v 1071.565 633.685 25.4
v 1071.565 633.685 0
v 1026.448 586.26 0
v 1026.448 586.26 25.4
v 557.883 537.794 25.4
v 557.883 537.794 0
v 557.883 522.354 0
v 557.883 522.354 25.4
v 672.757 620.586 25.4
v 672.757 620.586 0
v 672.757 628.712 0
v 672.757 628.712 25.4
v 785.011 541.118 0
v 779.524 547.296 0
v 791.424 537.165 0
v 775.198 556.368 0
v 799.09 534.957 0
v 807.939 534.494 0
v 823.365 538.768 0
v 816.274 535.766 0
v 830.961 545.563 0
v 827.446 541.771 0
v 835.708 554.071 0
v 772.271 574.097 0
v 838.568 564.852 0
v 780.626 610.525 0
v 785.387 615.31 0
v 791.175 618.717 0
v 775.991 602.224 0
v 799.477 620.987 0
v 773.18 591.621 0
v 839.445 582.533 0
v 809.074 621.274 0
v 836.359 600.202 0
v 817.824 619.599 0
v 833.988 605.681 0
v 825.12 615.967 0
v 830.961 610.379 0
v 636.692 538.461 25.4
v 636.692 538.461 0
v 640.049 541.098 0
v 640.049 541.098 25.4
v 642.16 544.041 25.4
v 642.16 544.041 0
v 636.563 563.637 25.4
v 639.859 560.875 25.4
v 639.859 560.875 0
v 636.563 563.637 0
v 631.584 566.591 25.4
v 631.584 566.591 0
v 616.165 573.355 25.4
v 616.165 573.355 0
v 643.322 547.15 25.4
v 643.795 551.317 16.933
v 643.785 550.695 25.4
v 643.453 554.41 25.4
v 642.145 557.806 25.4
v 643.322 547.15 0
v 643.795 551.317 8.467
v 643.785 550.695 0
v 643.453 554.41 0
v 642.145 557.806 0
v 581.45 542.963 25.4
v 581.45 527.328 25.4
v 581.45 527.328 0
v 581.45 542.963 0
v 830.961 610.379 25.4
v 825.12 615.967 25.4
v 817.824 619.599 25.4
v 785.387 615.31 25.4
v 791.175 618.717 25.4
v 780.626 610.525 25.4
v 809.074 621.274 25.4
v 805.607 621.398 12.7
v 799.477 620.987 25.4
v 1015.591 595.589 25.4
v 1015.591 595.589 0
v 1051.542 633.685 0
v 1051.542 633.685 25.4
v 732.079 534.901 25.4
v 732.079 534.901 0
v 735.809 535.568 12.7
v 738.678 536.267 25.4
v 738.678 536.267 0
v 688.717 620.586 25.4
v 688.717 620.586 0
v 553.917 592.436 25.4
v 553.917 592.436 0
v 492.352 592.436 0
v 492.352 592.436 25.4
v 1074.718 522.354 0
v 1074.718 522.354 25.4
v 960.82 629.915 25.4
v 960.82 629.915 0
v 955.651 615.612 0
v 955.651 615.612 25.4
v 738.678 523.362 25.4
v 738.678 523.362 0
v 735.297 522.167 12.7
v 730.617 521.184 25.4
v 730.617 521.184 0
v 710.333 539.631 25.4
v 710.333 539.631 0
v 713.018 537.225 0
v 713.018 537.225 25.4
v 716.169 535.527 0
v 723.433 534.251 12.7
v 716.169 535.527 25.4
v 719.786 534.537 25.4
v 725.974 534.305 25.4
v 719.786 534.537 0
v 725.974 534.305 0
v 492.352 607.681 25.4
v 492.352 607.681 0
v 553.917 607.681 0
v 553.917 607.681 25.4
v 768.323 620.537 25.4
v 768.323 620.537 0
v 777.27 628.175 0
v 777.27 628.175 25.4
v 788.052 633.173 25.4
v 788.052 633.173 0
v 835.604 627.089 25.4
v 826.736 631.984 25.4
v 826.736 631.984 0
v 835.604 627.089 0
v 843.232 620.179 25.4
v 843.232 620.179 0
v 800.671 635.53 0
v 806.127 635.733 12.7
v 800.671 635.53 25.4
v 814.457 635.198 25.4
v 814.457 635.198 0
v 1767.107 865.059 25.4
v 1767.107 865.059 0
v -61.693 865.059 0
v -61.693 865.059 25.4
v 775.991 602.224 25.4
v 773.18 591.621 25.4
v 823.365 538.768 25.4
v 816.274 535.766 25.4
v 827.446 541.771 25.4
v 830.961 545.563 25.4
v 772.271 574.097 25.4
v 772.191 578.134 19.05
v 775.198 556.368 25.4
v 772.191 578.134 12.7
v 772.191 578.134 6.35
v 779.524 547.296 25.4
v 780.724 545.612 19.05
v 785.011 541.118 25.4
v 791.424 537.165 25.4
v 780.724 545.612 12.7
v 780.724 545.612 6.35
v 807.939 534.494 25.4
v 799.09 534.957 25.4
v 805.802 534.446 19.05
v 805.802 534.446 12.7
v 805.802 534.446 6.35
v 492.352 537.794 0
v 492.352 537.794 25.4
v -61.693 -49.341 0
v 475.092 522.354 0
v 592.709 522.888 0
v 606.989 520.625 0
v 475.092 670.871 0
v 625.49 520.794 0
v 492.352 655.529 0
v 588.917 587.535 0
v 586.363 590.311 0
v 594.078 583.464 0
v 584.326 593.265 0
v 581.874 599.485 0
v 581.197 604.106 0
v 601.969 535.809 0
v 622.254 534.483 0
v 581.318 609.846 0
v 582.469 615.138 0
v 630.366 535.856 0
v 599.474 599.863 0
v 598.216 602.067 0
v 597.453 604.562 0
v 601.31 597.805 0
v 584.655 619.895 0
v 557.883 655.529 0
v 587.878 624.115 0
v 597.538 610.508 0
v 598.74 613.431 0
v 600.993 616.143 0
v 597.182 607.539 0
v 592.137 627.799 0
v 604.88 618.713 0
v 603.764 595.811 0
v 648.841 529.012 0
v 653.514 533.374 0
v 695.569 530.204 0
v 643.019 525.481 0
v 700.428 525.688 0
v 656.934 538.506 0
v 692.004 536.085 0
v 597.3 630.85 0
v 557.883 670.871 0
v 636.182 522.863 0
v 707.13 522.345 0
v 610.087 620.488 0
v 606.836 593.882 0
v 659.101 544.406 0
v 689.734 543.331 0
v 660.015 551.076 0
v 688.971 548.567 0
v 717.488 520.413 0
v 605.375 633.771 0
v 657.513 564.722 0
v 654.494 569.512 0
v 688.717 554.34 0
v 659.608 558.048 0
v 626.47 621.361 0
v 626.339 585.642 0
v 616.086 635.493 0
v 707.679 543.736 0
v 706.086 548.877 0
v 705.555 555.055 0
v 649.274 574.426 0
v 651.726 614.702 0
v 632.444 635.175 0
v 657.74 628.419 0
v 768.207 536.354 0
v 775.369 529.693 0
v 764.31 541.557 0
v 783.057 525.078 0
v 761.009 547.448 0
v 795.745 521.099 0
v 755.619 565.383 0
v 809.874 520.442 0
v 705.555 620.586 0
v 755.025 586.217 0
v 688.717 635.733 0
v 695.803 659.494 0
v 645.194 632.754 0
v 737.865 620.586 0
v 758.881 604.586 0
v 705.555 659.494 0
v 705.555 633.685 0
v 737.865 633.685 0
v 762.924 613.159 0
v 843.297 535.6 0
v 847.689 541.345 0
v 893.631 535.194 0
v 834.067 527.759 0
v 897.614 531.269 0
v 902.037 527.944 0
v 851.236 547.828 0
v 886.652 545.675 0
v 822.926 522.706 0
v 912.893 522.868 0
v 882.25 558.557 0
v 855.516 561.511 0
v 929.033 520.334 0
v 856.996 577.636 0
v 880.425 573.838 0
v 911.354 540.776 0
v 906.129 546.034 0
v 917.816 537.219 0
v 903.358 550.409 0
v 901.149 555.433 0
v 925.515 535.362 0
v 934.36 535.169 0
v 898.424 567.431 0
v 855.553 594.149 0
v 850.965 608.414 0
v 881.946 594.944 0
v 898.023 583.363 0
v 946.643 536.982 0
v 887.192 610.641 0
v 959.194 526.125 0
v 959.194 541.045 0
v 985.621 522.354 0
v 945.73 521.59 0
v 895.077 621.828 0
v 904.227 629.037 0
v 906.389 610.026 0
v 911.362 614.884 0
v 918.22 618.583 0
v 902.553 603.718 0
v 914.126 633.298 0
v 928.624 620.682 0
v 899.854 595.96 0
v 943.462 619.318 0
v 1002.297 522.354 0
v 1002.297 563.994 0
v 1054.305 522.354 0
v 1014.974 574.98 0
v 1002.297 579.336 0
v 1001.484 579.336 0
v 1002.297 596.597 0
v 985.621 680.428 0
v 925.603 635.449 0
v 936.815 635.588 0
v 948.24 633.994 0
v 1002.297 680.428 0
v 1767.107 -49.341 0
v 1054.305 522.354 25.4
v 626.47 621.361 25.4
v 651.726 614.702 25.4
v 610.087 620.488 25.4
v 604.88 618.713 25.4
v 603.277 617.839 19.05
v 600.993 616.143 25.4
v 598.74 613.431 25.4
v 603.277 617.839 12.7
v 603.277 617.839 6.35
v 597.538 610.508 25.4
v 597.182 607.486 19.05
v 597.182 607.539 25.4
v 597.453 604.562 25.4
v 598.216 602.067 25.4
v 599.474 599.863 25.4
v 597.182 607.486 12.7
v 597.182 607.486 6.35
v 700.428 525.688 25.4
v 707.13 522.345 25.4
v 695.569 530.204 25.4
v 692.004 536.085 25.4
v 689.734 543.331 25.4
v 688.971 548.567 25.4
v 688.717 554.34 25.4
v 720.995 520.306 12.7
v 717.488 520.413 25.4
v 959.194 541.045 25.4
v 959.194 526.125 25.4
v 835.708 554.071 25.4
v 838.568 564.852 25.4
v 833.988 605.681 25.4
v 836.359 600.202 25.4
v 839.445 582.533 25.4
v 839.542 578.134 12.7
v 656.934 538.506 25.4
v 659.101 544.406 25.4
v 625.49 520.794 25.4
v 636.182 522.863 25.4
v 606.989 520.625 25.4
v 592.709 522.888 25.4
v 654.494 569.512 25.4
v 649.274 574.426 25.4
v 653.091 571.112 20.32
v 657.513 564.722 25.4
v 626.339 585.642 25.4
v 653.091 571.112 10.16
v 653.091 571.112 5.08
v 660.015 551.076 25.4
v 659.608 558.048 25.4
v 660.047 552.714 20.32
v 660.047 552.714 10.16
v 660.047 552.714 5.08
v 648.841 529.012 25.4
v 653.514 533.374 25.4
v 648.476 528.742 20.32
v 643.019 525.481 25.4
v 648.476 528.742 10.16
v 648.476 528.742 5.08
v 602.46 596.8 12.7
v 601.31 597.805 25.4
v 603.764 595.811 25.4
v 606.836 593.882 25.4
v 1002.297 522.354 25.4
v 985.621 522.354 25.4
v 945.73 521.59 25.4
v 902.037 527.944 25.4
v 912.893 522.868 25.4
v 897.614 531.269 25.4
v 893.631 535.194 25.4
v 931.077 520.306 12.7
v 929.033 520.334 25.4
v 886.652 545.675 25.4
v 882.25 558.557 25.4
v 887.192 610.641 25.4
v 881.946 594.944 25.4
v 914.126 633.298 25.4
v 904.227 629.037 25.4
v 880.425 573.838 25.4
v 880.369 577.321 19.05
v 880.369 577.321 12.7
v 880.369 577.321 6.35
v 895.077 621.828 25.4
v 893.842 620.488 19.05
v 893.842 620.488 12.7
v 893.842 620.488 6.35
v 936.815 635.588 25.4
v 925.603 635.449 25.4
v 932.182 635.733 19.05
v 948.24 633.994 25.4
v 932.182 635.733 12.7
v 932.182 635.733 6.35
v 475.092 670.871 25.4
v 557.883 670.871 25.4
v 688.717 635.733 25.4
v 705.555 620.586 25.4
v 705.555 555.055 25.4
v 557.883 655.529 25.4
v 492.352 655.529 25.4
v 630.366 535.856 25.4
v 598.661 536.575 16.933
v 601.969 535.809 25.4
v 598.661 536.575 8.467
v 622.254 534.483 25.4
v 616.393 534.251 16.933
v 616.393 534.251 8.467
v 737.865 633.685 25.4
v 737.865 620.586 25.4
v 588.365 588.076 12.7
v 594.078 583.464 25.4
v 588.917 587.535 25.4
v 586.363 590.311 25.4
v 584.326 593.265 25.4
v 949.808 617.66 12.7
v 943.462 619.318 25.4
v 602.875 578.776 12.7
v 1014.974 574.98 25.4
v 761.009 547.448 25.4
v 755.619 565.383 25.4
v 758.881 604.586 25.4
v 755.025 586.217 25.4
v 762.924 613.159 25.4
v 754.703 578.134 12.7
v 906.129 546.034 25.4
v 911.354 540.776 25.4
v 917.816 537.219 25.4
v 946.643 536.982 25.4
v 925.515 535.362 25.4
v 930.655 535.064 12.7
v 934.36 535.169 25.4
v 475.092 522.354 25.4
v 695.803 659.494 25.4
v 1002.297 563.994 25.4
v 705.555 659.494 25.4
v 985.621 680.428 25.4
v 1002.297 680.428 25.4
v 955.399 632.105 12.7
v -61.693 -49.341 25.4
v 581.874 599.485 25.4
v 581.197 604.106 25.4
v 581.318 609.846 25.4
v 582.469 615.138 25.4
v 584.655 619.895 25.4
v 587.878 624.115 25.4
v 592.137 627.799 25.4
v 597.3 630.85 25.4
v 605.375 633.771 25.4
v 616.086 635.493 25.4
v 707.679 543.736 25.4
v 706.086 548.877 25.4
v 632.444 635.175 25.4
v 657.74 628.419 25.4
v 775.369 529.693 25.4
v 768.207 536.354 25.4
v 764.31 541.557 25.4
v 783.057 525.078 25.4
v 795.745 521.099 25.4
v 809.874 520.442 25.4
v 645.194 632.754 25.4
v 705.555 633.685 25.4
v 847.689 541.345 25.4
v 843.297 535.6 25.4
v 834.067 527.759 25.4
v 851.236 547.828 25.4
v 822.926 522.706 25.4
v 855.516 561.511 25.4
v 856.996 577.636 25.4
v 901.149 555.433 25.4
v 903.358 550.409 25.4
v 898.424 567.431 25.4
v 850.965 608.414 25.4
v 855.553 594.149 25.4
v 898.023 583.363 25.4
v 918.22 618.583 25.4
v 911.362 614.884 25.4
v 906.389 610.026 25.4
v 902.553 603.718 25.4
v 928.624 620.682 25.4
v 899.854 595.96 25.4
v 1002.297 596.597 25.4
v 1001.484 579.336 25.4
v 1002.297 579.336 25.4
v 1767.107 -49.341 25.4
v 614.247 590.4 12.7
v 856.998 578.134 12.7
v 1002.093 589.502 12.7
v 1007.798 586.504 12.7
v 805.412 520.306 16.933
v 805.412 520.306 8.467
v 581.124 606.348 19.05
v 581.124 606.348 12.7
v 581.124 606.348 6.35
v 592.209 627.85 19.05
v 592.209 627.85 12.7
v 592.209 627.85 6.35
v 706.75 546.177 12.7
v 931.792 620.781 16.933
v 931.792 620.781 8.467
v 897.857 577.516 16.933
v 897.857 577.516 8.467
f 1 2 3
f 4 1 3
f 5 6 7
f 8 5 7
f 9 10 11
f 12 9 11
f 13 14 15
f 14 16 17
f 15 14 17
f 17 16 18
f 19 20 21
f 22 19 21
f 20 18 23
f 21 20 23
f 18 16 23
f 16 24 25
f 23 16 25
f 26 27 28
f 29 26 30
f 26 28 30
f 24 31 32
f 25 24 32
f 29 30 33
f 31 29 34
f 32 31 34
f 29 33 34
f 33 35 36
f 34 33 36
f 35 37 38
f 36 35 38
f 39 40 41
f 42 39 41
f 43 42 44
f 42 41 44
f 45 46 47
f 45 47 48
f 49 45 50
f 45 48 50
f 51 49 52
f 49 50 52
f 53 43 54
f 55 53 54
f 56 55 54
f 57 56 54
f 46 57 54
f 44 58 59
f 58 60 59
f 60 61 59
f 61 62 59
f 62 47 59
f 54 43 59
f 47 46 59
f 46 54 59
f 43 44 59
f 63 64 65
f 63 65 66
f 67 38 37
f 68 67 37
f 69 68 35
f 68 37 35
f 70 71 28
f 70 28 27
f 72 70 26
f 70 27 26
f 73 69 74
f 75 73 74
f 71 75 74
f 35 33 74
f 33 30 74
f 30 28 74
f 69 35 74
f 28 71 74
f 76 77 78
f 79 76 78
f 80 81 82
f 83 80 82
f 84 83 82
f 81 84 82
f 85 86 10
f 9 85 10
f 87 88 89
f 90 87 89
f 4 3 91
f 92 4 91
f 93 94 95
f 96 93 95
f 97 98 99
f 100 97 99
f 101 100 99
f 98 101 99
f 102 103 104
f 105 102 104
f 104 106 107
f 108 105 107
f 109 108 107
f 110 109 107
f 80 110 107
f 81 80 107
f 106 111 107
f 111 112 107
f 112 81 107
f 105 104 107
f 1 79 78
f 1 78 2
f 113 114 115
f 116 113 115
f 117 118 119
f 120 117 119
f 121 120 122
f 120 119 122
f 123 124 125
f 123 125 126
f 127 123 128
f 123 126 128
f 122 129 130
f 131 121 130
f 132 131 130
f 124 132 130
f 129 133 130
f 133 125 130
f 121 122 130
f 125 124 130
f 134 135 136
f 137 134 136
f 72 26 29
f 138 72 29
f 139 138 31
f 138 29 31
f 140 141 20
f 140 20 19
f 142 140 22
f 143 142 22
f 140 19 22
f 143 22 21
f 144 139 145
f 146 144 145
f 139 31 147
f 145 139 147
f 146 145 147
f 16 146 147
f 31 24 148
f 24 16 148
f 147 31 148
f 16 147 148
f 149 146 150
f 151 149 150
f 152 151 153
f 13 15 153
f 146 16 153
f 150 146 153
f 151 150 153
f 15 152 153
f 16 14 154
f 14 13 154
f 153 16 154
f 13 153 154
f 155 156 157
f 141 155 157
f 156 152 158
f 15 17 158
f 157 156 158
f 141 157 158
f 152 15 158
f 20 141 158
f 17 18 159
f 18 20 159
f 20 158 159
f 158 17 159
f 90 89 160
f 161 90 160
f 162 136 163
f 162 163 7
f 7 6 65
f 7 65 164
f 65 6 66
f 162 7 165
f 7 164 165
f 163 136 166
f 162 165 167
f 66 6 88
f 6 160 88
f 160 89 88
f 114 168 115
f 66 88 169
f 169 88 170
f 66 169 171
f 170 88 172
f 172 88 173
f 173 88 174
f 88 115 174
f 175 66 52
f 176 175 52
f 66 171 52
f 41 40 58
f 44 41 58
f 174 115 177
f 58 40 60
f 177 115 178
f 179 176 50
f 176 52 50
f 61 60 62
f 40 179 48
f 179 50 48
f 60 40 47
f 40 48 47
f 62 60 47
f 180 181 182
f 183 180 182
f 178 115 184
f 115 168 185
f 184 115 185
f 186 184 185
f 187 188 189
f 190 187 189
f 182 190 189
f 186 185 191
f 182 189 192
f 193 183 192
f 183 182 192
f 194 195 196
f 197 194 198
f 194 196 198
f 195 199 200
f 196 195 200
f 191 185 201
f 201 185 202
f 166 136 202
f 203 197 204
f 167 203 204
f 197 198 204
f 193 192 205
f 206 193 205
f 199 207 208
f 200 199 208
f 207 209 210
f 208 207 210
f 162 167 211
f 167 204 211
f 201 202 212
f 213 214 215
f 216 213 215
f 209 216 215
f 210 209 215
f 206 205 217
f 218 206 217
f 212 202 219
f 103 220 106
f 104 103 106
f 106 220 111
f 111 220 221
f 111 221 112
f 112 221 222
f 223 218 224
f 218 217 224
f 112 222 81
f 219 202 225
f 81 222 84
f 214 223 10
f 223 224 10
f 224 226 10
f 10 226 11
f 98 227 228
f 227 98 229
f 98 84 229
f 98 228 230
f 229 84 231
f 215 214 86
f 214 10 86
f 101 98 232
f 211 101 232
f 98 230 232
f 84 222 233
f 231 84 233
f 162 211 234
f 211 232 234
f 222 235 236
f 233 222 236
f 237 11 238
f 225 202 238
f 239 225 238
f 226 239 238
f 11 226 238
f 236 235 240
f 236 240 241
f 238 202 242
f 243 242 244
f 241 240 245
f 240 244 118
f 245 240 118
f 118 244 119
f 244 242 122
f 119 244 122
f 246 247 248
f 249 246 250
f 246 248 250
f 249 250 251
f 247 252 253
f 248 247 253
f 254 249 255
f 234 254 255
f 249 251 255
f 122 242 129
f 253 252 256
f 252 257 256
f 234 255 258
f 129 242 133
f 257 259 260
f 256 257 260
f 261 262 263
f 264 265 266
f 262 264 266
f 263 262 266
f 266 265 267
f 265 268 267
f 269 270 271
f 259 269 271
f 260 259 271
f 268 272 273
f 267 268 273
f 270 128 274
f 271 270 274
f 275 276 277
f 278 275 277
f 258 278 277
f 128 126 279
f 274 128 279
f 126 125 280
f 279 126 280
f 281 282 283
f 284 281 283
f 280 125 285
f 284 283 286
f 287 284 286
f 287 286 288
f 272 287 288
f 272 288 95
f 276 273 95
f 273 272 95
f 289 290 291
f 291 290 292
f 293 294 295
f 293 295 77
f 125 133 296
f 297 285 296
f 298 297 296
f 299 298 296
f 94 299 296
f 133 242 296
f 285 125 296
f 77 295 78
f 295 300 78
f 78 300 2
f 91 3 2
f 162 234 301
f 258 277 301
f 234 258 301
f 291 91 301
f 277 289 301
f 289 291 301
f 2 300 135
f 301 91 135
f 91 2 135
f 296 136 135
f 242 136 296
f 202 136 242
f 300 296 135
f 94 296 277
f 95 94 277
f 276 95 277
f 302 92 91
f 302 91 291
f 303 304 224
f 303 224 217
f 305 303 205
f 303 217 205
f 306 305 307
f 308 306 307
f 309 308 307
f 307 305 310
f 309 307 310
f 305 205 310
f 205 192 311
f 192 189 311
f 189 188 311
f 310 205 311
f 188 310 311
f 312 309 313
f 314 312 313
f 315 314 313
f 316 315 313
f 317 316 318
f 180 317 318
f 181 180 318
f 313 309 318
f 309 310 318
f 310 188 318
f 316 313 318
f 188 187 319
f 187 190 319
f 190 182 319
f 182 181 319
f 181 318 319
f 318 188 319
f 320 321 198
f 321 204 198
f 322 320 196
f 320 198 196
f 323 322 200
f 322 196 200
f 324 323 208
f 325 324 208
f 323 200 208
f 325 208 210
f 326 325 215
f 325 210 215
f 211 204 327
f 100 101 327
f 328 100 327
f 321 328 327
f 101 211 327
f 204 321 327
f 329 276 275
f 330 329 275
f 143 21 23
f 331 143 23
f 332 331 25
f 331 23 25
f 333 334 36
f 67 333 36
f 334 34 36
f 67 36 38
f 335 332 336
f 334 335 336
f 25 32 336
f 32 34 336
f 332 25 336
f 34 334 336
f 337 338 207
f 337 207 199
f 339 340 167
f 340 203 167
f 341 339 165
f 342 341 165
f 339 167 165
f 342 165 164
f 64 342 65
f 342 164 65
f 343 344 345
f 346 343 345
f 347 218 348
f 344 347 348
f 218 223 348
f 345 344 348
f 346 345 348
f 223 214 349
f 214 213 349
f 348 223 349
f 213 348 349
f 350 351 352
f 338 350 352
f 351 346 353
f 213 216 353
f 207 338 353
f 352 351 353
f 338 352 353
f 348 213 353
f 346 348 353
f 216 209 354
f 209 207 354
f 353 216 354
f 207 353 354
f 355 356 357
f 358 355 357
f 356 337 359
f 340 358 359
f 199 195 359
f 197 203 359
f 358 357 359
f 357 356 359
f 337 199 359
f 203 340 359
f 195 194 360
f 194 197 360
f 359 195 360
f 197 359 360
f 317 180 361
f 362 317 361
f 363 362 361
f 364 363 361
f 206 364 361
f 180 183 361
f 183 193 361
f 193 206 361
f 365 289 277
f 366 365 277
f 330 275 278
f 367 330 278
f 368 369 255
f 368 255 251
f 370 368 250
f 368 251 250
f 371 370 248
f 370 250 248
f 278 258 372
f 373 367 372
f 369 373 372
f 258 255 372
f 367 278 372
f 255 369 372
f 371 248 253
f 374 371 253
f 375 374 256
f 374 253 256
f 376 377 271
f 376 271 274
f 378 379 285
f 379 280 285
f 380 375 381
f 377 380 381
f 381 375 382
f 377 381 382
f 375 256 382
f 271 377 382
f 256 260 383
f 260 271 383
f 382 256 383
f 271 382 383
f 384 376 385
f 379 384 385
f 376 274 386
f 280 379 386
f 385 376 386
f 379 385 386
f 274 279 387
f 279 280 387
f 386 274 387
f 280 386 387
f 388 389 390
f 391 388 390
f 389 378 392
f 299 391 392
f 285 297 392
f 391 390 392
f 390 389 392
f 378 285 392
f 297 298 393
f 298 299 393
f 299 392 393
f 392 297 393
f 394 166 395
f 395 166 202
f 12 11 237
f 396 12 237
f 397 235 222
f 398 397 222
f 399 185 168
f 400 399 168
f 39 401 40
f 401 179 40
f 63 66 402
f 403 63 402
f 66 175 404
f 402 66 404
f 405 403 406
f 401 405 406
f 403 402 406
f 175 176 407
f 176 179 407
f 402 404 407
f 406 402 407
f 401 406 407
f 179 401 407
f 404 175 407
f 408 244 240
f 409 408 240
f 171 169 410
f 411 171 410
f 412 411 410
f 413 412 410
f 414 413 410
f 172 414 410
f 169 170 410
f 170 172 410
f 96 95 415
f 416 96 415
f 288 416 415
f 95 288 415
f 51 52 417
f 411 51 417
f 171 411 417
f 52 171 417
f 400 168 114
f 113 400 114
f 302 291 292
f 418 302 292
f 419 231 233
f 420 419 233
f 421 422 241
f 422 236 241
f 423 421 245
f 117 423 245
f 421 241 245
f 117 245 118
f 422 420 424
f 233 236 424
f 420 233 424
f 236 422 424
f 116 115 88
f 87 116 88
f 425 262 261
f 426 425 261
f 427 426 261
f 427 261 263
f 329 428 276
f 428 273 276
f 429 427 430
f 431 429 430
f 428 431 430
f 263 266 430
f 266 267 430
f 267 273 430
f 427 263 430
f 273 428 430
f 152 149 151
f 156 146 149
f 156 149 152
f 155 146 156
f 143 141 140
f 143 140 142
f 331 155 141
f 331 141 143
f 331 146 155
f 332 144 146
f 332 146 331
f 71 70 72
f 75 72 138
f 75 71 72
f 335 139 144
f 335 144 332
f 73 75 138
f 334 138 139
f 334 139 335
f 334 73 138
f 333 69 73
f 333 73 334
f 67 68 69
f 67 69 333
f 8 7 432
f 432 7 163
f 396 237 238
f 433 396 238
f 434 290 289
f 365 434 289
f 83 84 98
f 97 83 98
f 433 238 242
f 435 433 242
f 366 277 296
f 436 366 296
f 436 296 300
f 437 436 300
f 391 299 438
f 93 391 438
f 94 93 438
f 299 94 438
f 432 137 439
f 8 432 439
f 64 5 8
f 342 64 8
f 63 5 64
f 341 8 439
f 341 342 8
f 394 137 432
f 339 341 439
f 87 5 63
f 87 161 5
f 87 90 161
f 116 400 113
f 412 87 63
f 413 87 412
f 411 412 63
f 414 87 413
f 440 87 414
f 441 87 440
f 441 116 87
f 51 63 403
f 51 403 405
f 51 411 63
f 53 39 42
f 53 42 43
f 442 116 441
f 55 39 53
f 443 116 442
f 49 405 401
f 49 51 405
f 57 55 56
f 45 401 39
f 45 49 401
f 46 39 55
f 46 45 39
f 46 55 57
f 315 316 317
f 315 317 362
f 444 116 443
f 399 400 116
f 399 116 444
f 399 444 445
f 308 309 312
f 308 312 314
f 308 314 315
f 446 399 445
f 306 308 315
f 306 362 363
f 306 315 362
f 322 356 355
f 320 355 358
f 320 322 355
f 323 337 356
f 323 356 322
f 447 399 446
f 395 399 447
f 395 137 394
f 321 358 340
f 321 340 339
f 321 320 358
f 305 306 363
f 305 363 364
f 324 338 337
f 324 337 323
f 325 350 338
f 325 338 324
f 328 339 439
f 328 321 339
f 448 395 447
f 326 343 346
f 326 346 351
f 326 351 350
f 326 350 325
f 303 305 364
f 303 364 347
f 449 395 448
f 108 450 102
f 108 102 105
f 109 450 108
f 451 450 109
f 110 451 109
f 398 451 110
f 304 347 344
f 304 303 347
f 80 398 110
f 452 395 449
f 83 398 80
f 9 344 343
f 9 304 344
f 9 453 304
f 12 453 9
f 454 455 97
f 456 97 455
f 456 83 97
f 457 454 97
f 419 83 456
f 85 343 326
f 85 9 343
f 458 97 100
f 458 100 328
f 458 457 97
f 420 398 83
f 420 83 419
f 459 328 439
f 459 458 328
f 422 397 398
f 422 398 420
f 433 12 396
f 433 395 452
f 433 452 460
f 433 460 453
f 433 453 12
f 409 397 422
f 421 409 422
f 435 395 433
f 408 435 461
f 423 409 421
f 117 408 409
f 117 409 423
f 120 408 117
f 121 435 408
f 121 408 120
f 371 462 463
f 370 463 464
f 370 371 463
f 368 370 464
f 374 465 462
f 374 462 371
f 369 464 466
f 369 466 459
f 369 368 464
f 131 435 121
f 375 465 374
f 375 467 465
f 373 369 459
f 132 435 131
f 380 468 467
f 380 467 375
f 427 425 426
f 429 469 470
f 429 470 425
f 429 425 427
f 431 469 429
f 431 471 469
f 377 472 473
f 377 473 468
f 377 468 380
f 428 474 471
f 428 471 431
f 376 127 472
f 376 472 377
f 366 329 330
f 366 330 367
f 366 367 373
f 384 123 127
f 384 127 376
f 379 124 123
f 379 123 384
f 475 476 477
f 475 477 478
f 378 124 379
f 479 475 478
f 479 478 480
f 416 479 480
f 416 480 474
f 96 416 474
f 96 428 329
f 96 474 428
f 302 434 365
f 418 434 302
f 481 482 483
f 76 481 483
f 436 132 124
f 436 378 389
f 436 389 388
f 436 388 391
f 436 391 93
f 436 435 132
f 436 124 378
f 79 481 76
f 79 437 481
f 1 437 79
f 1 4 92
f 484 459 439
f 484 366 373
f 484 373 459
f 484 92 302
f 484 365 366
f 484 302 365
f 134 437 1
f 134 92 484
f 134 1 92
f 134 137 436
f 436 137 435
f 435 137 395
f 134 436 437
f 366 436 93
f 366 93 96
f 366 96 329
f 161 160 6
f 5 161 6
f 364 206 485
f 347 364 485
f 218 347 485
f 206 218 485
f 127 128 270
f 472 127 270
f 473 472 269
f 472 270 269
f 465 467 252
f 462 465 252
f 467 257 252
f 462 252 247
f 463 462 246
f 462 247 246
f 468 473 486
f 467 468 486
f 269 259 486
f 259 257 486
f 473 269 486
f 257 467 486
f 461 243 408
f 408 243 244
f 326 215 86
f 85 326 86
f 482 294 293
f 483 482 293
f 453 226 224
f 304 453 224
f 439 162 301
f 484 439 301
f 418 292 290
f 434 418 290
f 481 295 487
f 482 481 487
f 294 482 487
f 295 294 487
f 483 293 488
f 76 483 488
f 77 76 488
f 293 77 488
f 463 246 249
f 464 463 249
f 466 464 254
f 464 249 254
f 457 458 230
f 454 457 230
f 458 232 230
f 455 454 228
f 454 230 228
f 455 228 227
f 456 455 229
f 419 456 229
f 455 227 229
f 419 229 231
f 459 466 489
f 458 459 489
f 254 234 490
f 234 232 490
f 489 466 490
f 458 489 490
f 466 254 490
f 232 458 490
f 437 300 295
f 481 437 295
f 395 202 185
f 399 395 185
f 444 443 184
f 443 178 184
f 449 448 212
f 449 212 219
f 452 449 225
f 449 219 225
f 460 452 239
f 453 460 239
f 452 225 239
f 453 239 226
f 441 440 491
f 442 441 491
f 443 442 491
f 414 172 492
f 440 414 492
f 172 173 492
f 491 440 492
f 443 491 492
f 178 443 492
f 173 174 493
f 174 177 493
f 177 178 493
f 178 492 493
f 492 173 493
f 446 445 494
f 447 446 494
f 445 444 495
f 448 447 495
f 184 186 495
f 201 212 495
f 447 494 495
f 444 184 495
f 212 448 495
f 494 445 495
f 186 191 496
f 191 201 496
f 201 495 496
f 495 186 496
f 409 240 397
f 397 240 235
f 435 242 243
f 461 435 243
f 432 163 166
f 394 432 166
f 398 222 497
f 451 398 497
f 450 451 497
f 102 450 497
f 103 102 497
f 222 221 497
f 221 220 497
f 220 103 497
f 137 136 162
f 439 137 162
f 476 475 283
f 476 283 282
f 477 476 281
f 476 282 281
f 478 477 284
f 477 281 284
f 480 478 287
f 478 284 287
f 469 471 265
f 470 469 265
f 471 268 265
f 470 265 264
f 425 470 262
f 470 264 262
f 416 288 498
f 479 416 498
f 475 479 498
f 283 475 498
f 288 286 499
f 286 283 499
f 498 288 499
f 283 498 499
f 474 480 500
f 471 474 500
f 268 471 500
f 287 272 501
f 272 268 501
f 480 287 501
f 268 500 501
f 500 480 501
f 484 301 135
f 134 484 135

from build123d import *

# Parameters (mm, degrees)
F1_DEPTH = 25.4


with BuildPart() as f1:
    # F0 (on Top) → F1 (new body)
    with BuildSketch(Plane.XY):
        Polygon((-61.692815274, 865.0585784256), (-61.692815274, -49.3414215744), (1767.107184726, -49.3414215744), (1767.107184726, 407.8585784256), (1767.107184726, 865.0585784256), align=None)
        with BuildLine():
            add(Edge.make_bspline(
                [(653.0913421884, 571.1123594083), (660.0474913139, 563.7986512156), (660.0474913139, 552.7143201325)],
                knots=[0, 0, 0, 1, 1, 1], degree=2))
            add(Edge.make_bspline(
                [(660.0474913139, 552.7143201325), (660.0474913139, 537.1767533943), (648.4755796846, 528.7416099454)],
                knots=[0, 0, 0, 1, 1, 1], degree=2))
            add(Edge.make_bspline(
                [(648.4755796846, 528.7416099454), (636.9036680553, 520.3064664965), (615.9702099394, 520.3064664965)],
                knots=[0, 0, 0, 1, 1, 1], degree=2))
            add(Edge.make_bspline(
                [(615.9702099394, 520.3064664965), (593.8340531429, 520.3064664965), (581.44950727, 527.3276263615)],
                knots=[0, 0, 0, 1, 1, 1], degree=2))
            Line((581.44950727, 527.3276263615), (581.44950727, 542.962709209))
            add(Edge.make_bspline(
                [(581.44950727, 542.962709209), (589.4783335971, 538.8995379908), (598.6611005501, 536.575404054)],
                knots=[0, 0, 0, 1, 1, 1], degree=2))
            add(Edge.make_bspline(
                [(598.6611005501, 536.575404054), (607.8438675031, 534.2512701172), (616.3927797461, 534.2512701172)],
                knots=[0, 0, 0, 1, 1, 1], degree=2))
            add(Edge.make_bspline(
                [(616.3927797461, 534.2512701172), (629.5899598626, 534.2512701172), (636.692383152, 538.4607154992)],
                knots=[0, 0, 0, 1, 1, 1], degree=2))
            add(Edge.make_bspline(
                [(636.692383152, 538.4607154992), (643.7948064413, 542.6701608812), (643.7948064413, 551.3165892335)],
                knots=[0, 0, 0, 1, 1, 1], degree=2))
            add(Edge.make_bspline(
                [(643.7948064413, 551.3165892335), (643.7948064413, 557.8176631825), (638.1713774754, 562.4334256863)],
                knots=[0, 0, 0, 1, 1, 1], degree=2))
            add(Edge.make_bspline(
                [(638.1713774754, 562.4334256863), (632.5479485095, 567.0491881901), (616.1652421579, 573.3552299207)],
                knots=[0, 0, 0, 1, 1, 1], degree=2))
            add(Edge.make_bspline(
                [(616.1652421579, 573.3552299207), (600.6276754197, 579.1411857354), (594.077843416, 583.4643999115)],
                knots=[0, 0, 0, 1, 1, 1], degree=2))
            add(Edge.make_bspline(
                [(594.077843416, 583.4643999115), (587.5280114124, 587.7876140876), (584.3262324925, 593.2647688896)],
                knots=[0, 0, 0, 1, 1, 1], degree=2))
            add(Edge.make_bspline(
                [(584.3262324925, 593.2647688896), (581.1244535726, 598.7419236917), (581.1244535726, 606.3481802121)],
                knots=[0, 0, 0, 1, 1, 1], degree=2))
            add(Edge.make_bspline(
                [(581.1244535726, 606.3481802121), (581.1244535726, 619.9679301353), (592.2087846557, 627.8504822985)],
                knots=[0, 0, 0, 1, 1, 1], degree=2))
            add(Edge.make_bspline(
                [(592.2087846557, 627.8504822985), (603.2931157388, 635.7330344617), (622.5687999977, 635.7330344617)],
                knots=[0, 0, 0, 1, 1, 1], degree=2))
            add(Edge.make_bspline(
                [(622.5687999977, 635.7330344617), (640.5442694668, 635.7330344617), (657.739610062, 628.4193262691)],
                knots=[0, 0, 0, 1, 1, 1], degree=2))
            Line((657.739610062, 628.4193262691), (651.7261166591, 614.7020602366))
            add(Edge.make_bspline(
                [(651.7261166591, 614.7020602366), (634.9858512403, 621.5931986226), (621.3661013171, 621.5931986226)],
                knots=[0, 0, 0, 1, 1, 1], degree=2))
            add(Edge.make_bspline(
                [(621.3661013171, 621.5931986226), (609.3716198811, 621.5931986226), (603.2768630539, 617.838828417)],
                knots=[0, 0, 0, 1, 1, 1], degree=2))
            add(Edge.make_bspline(
                [(603.2768630539, 617.838828417), (597.1821062267, 614.0844582114), (597.1821062267, 607.4858681532)],
                knots=[0, 0, 0, 1, 1, 1], degree=2))
            add(Edge.make_bspline(
                [(597.1821062267, 607.4858681532), (597.1821062267, 603.0001271283), (599.4737347937, 599.8633589479)],
                knots=[0, 0, 0, 1, 1, 1], degree=2))
            add(Edge.make_bspline(
                [(599.4737347937, 599.8633589479), (601.7653633608, 596.7265907675), (606.836201041, 593.8823709148)],
                knots=[0, 0, 0, 1, 1, 1], degree=2))
            add(Edge.make_bspline(
                [(606.836201041, 593.8823709148), (611.9070387213, 591.0381510621), (626.3394228881, 585.6422596844)],
                knots=[0, 0, 0, 1, 1, 1], degree=2))
            add(Edge.make_bspline(
                [(626.3394228881, 585.6422596844), (646.1351930629, 578.426067601), (653.0913421884, 571.1123594083)],
                knots=[0, 0, 0, 1, 1, 1], degree=2))
        make_face(mode=Mode.SUBTRACT)
        Polygon((557.8831142047, 537.7943554195), (557.8831142047, 522.3543047905), (475.0919374637, 522.3543047905), (475.0919374637, 670.8713391563), (557.8831142047, 670.8713391563), (557.8831142047, 655.5288046366), (492.3522887984, 655.5288046366), (492.3522887984, 607.6809003716), (553.9174590958, 607.6809003716), (553.9174590958, 592.4358819611), (492.3522887984, 592.4358819611), (492.3522887984, 537.7943554195), align=None, mode=Mode.SUBTRACT)
        with BuildLine():
            add(Edge.make_bspline(
                [(843.2315025129, 620.1792150387), (856.9975266, 604.6253956156), (856.9975266, 578.1335192733)],
                knots=[0, 0, 0, 1, 1, 1], degree=2))
            add(Edge.make_bspline(
                [(856.9975266, 578.1335192733), (856.9975266, 550.8940194268), (843.2965132524, 535.6002429617)],
                knots=[0, 0, 0, 1, 1, 1], degree=2))
            add(Edge.make_bspline(
                [(843.2965132524, 535.6002429617), (829.5954999048, 520.3064664965), (805.4115048144, 520.3064664965)],
                knots=[0, 0, 0, 1, 1, 1], degree=2))
            add(Edge.make_bspline(
                [(805.4115048144, 520.3064664965), (790.4590347316, 520.3064664965), (778.8871231023, 527.3276263615)],
                knots=[0, 0, 0, 1, 1, 1], degree=2))
            add(Edge.make_bspline(
                [(778.8871231023, 527.3276263615), (767.315211473, 534.3487862265), (761.0091697425, 547.4484502338)],
                knots=[0, 0, 0, 1, 1, 1], degree=2))
            add(Edge.make_bspline(
                [(761.0091697425, 547.4484502338), (754.7031280119, 560.5481142411), (754.7031280119, 578.1335192733)],
                knots=[0, 0, 0, 1, 1, 1], degree=2))
            add(Edge.make_bspline(
                [(754.7031280119, 578.1335192733), (754.7031280119, 605.34051375), (768.3228779351, 620.5367741059)],
                knots=[0, 0, 0, 1, 1, 1], degree=2))
            add(Edge.make_bspline(
                [(768.3228779351, 620.5367741059), (781.9426278584, 635.7330344617), (806.1266229488, 635.7330344617)],
                knots=[0, 0, 0, 1, 1, 1], degree=2))
            add(Edge.make_bspline(
                [(806.1266229488, 635.7330344617), (829.4654784258, 635.7330344617), (843.2315025129, 620.1792150387)],
                knots=[0, 0, 0, 1, 1, 1], degree=2))
        make_face(mode=Mode.SUBTRACT)
        with BuildLine():
            add(Edge.make_bspline(
                [(710.3332983097, 539.6309088101), (715.1115876622, 534.2512701172), (723.432962317, 534.2512701172)],
                knots=[0, 0, 0, 1, 1, 1], degree=2))
            add(Edge.make_bspline(
                [(723.432962317, 534.2512701172), (727.9187033419, 534.2512701172), (732.0793906692, 534.9013775121)],
                knots=[0, 0, 0, 1, 1, 1], degree=2))
            add(Edge.make_bspline(
                [(732.0793906692, 534.9013775121), (736.2400779966, 535.551484907), (738.6779807275, 536.2666030414)],
                knots=[0, 0, 0, 1, 1, 1], degree=2))
            Line((738.6779807275, 536.2666030414), (738.6779807275, 523.3619712526))
            add(Edge.make_bspline(
                [(738.6779807275, 523.3619712526), (735.9475296689, 522.0617564628), (730.6166490307, 521.1841114797)],
                knots=[0, 0, 0, 1, 1, 1], degree=2))
            add(Edge.make_bspline(
                [(730.6166490307, 521.1841114797), (725.2857683925, 520.3064664965), (720.9950595861, 520.3064664965)],
                knots=[0, 0, 0, 1, 1, 1], degree=2))
            add(Edge.make_bspline(
                [(720.9950595861, 520.3064664965), (688.7172274292, 520.3064664965), (688.7172274292, 554.3395886198)],
                knots=[0, 0, 0, 1, 1, 1], degree=2))
            Line((688.7172274292, 554.3395886198), (688.7172274292, 620.5855321605))
            Line((688.7172274292, 620.5855321605), (672.7570908843, 620.5855321605))
            Line((672.7570908843, 620.5855321605), (672.7570908843, 628.7118745968))
            Line((672.7570908843, 628.7118745968), (688.7172274292, 635.7330344617))
            Line((688.7172274292, 635.7330344617), (695.8033980336, 659.4944597455))
            Line((695.8033980336, 659.4944597455), (705.5550089572, 659.4944597455))
            Line((705.5550089572, 659.4944597455), (705.5550089572, 633.6851961678))
            Line((705.5550089572, 633.6851961678), (737.8653464839, 633.6851961678))
            Line((737.8653464839, 633.6851961678), (737.8653464839, 620.5855321605))
            Line((737.8653464839, 620.5855321605), (705.5550089572, 620.5855321605))
            Line((705.5550089572, 620.5855321605), (705.5550089572, 555.0547067542))
            add(Edge.make_bspline(
                [(705.5550089572, 555.0547067542), (705.5550089572, 545.0105475029), (710.3332983097, 539.6309088101)],
                knots=[0, 0, 0, 1, 1, 1], degree=2))
        make_face(mode=Mode.SUBTRACT)
        with BuildLine():
            add(Edge.make_bspline(
                [(959.1944090789, 526.1249276809), (948.0450672563, 520.3064664965), (931.0772642493, 520.3064664965)],
                knots=[0, 0, 0, 1, 1, 1], degree=2))
            add(Edge.make_bspline(
                [(931.0772642493, 520.3064664965), (906.8932691589, 520.3064664965), (893.6310783029, 535.1939258398)],
                knots=[0, 0, 0, 1, 1, 1], degree=2))
            add(Edge.make_bspline(
                [(893.6310783029, 535.1939258398), (880.3688874468, 550.0813851831), (880.3688874468, 577.3208850296)],
                knots=[0, 0, 0, 1, 1, 1], degree=2))
            add(Edge.make_bspline(
                [(880.3688874468, 577.3208850296), (880.3688874468, 605.2429976407), (893.8423632062, 620.4880160512)],
                knots=[0, 0, 0, 1, 1, 1], degree=2))
            add(Edge.make_bspline(
                [(893.8423632062, 620.4880160512), (907.3158389656, 635.7330344617), (932.1824468207, 635.7330344617)],
                knots=[0, 0, 0, 1, 1, 1], degree=2))
            add(Edge.make_bspline(
                [(932.1824468207, 635.7330344617), (940.2112731477, 635.7330344617), (948.2400994748, 633.9939971804)],
                knots=[0, 0, 0, 1, 1, 1], degree=2))
            add(Edge.make_bspline(
                [(948.2400994748, 633.9939971804), (956.2689258019, 632.254959899), (960.8196775662, 629.9145732773)],
                knots=[0, 0, 0, 1, 1, 1], degree=2))
            Line((960.8196775662, 629.9145732773), (955.6513237767, 615.6122105895))
            add(Edge.make_bspline(
                [(955.6513237767, 615.6122105895), (950.0604001805, 617.8550811019), (943.4618101222, 619.3178227404)],
                knots=[0, 0, 0, 1, 1, 1], degree=2))
            add(Edge.make_bspline(
                [(943.4618101222, 619.3178227404), (936.863220064, 620.7805643789), (931.7923823837, 620.7805643789)],
                knots=[0, 0, 0, 1, 1, 1], degree=2))
            add(Edge.make_bspline(
                [(931.7923823837, 620.7805643789), (897.8567763697, 620.7805643789), (897.8567763697, 577.5159172481)],
                knots=[0, 0, 0, 1, 1, 1], degree=2))
            add(Edge.make_bspline(
                [(897.8567763697, 577.5159172481), (897.8567763697, 557.0050289389), (906.1293929699, 546.0344666499)],
                knots=[0, 0, 0, 1, 1, 1], degree=2))
            add(Edge.make_bspline(
                [(906.1293929699, 546.0344666499), (914.40200957, 535.0639043609), (930.6546944426, 535.0639043609)],
                knots=[0, 0, 0, 1, 1, 1], degree=2))
            add(Edge.make_bspline(
                [(930.6546944426, 535.0639043609), (944.5669926936, 535.0639043609), (959.1944090789, 541.044892394)],
                knots=[0, 0, 0, 1, 1, 1], degree=2))
            Line((959.1944090789, 541.044892394), (959.1944090789, 526.1249276809))
        make_face(mode=Mode.SUBTRACT)
        with BuildLine():
            Line((1001.4838951174, 579.3362179538), (1002.296529361, 579.3362179538))
            add(Edge.make_bspline(
                [(1002.296529361, 579.3362179538), (1006.6522489069, 585.5447435752), (1015.5912255868, 595.5889028264)],
                knots=[0, 0, 0, 1, 1, 1], degree=2))
            Line((1015.5912255868, 595.5889028264), (1051.542164525, 633.6851961678))
            Line((1051.542164525, 633.6851961678), (1071.5654722881, 633.6851961678))
            Line((1071.5654722881, 633.6851961678), (1026.4480190817, 586.2598617096))
            Line((1026.4480190817, 586.2598617096), (1074.7184931533, 522.3543047905))
            Line((1074.7184931533, 522.3543047905), (1054.3051209534, 522.3543047905))
            Line((1054.3051209534, 522.3543047905), (1014.9736235617, 574.980498408))
            Line((1014.9736235617, 574.980498408), (1002.296529361, 563.9936834341))
            Line((1002.296529361, 563.9936834341), (1002.296529361, 522.3543047905))
            Line((1002.296529361, 522.3543047905), (985.6212746818, 522.3543047905))
            Line((985.6212746818, 522.3543047905), (985.6212746818, 680.4279178614))
            Line((985.6212746818, 680.4279178614), (1002.296529361, 680.4279178614))
            Line((1002.296529361, 680.4279178614), (1002.296529361, 596.5965692885))
            add(Edge.make_bspline(
                [(1002.296529361, 596.5965692885), (1002.296529361, 591.0381510621), (1001.4838951174, 579.3362179538)],
                knots=[0, 0, 0, 1, 1, 1], degree=2))
        make_face(mode=Mode.SUBTRACT)
    extrude(amount=F1_DEPTH)


with BuildPart() as f1b:
    # F0 (on Top) → F1, piece 2 (new body)
    with BuildSketch(Plane.XY):
        with BuildLine():
            add(Edge.make_bspline(
                [(780.6261603837, 610.5251202243), (772.1910169348, 599.6520740446), (772.1910169348, 578.1335192733)],
                knots=[0, 0, 0, 1, 1, 1], degree=2))
            add(Edge.make_bspline(
                [(772.1910169348, 578.1335192733), (772.1910169348, 556.7774913507), (780.7236764929, 545.6118968432)],
                knots=[0, 0, 0, 1, 1, 1], degree=2))
            add(Edge.make_bspline(
                [(780.7236764929, 545.6118968432), (789.256336051, 534.4463023357), (805.8015692513, 534.4463023357)],
                knots=[0, 0, 0, 1, 1, 1], degree=2))
            add(Edge.make_bspline(
                [(805.8015692513, 534.4463023357), (822.3793078214, 534.4463023357), (830.9607254341, 545.5631387886)],
                knots=[0, 0, 0, 1, 1, 1], degree=2))
            add(Edge.make_bspline(
                [(830.9607254341, 545.5631387886), (839.5421430469, 556.6799752414), (839.5421430469, 578.1335192733)],
                knots=[0, 0, 0, 1, 1, 1], degree=2))
            add(Edge.make_bspline(
                [(839.5421430469, 578.1335192733), (839.5421430469, 599.3595257169), (830.9607254341, 610.3788460605)],
                knots=[0, 0, 0, 1, 1, 1], degree=2))
            add(Edge.make_bspline(
                [(830.9607254341, 610.3788460605), (822.3793078214, 621.3981664041), (805.6065370329, 621.3981664041)],
                knots=[0, 0, 0, 1, 1, 1], degree=2))
            add(Edge.make_bspline(
                [(805.6065370329, 621.3981664041), (789.0613038326, 621.3981664041), (780.6261603837, 610.5251202243)],
                knots=[0, 0, 0, 1, 1, 1], degree=2))
        make_face()
    extrude(amount=F1_DEPTH)


solid = Compound([f1.part, f1b.part])
